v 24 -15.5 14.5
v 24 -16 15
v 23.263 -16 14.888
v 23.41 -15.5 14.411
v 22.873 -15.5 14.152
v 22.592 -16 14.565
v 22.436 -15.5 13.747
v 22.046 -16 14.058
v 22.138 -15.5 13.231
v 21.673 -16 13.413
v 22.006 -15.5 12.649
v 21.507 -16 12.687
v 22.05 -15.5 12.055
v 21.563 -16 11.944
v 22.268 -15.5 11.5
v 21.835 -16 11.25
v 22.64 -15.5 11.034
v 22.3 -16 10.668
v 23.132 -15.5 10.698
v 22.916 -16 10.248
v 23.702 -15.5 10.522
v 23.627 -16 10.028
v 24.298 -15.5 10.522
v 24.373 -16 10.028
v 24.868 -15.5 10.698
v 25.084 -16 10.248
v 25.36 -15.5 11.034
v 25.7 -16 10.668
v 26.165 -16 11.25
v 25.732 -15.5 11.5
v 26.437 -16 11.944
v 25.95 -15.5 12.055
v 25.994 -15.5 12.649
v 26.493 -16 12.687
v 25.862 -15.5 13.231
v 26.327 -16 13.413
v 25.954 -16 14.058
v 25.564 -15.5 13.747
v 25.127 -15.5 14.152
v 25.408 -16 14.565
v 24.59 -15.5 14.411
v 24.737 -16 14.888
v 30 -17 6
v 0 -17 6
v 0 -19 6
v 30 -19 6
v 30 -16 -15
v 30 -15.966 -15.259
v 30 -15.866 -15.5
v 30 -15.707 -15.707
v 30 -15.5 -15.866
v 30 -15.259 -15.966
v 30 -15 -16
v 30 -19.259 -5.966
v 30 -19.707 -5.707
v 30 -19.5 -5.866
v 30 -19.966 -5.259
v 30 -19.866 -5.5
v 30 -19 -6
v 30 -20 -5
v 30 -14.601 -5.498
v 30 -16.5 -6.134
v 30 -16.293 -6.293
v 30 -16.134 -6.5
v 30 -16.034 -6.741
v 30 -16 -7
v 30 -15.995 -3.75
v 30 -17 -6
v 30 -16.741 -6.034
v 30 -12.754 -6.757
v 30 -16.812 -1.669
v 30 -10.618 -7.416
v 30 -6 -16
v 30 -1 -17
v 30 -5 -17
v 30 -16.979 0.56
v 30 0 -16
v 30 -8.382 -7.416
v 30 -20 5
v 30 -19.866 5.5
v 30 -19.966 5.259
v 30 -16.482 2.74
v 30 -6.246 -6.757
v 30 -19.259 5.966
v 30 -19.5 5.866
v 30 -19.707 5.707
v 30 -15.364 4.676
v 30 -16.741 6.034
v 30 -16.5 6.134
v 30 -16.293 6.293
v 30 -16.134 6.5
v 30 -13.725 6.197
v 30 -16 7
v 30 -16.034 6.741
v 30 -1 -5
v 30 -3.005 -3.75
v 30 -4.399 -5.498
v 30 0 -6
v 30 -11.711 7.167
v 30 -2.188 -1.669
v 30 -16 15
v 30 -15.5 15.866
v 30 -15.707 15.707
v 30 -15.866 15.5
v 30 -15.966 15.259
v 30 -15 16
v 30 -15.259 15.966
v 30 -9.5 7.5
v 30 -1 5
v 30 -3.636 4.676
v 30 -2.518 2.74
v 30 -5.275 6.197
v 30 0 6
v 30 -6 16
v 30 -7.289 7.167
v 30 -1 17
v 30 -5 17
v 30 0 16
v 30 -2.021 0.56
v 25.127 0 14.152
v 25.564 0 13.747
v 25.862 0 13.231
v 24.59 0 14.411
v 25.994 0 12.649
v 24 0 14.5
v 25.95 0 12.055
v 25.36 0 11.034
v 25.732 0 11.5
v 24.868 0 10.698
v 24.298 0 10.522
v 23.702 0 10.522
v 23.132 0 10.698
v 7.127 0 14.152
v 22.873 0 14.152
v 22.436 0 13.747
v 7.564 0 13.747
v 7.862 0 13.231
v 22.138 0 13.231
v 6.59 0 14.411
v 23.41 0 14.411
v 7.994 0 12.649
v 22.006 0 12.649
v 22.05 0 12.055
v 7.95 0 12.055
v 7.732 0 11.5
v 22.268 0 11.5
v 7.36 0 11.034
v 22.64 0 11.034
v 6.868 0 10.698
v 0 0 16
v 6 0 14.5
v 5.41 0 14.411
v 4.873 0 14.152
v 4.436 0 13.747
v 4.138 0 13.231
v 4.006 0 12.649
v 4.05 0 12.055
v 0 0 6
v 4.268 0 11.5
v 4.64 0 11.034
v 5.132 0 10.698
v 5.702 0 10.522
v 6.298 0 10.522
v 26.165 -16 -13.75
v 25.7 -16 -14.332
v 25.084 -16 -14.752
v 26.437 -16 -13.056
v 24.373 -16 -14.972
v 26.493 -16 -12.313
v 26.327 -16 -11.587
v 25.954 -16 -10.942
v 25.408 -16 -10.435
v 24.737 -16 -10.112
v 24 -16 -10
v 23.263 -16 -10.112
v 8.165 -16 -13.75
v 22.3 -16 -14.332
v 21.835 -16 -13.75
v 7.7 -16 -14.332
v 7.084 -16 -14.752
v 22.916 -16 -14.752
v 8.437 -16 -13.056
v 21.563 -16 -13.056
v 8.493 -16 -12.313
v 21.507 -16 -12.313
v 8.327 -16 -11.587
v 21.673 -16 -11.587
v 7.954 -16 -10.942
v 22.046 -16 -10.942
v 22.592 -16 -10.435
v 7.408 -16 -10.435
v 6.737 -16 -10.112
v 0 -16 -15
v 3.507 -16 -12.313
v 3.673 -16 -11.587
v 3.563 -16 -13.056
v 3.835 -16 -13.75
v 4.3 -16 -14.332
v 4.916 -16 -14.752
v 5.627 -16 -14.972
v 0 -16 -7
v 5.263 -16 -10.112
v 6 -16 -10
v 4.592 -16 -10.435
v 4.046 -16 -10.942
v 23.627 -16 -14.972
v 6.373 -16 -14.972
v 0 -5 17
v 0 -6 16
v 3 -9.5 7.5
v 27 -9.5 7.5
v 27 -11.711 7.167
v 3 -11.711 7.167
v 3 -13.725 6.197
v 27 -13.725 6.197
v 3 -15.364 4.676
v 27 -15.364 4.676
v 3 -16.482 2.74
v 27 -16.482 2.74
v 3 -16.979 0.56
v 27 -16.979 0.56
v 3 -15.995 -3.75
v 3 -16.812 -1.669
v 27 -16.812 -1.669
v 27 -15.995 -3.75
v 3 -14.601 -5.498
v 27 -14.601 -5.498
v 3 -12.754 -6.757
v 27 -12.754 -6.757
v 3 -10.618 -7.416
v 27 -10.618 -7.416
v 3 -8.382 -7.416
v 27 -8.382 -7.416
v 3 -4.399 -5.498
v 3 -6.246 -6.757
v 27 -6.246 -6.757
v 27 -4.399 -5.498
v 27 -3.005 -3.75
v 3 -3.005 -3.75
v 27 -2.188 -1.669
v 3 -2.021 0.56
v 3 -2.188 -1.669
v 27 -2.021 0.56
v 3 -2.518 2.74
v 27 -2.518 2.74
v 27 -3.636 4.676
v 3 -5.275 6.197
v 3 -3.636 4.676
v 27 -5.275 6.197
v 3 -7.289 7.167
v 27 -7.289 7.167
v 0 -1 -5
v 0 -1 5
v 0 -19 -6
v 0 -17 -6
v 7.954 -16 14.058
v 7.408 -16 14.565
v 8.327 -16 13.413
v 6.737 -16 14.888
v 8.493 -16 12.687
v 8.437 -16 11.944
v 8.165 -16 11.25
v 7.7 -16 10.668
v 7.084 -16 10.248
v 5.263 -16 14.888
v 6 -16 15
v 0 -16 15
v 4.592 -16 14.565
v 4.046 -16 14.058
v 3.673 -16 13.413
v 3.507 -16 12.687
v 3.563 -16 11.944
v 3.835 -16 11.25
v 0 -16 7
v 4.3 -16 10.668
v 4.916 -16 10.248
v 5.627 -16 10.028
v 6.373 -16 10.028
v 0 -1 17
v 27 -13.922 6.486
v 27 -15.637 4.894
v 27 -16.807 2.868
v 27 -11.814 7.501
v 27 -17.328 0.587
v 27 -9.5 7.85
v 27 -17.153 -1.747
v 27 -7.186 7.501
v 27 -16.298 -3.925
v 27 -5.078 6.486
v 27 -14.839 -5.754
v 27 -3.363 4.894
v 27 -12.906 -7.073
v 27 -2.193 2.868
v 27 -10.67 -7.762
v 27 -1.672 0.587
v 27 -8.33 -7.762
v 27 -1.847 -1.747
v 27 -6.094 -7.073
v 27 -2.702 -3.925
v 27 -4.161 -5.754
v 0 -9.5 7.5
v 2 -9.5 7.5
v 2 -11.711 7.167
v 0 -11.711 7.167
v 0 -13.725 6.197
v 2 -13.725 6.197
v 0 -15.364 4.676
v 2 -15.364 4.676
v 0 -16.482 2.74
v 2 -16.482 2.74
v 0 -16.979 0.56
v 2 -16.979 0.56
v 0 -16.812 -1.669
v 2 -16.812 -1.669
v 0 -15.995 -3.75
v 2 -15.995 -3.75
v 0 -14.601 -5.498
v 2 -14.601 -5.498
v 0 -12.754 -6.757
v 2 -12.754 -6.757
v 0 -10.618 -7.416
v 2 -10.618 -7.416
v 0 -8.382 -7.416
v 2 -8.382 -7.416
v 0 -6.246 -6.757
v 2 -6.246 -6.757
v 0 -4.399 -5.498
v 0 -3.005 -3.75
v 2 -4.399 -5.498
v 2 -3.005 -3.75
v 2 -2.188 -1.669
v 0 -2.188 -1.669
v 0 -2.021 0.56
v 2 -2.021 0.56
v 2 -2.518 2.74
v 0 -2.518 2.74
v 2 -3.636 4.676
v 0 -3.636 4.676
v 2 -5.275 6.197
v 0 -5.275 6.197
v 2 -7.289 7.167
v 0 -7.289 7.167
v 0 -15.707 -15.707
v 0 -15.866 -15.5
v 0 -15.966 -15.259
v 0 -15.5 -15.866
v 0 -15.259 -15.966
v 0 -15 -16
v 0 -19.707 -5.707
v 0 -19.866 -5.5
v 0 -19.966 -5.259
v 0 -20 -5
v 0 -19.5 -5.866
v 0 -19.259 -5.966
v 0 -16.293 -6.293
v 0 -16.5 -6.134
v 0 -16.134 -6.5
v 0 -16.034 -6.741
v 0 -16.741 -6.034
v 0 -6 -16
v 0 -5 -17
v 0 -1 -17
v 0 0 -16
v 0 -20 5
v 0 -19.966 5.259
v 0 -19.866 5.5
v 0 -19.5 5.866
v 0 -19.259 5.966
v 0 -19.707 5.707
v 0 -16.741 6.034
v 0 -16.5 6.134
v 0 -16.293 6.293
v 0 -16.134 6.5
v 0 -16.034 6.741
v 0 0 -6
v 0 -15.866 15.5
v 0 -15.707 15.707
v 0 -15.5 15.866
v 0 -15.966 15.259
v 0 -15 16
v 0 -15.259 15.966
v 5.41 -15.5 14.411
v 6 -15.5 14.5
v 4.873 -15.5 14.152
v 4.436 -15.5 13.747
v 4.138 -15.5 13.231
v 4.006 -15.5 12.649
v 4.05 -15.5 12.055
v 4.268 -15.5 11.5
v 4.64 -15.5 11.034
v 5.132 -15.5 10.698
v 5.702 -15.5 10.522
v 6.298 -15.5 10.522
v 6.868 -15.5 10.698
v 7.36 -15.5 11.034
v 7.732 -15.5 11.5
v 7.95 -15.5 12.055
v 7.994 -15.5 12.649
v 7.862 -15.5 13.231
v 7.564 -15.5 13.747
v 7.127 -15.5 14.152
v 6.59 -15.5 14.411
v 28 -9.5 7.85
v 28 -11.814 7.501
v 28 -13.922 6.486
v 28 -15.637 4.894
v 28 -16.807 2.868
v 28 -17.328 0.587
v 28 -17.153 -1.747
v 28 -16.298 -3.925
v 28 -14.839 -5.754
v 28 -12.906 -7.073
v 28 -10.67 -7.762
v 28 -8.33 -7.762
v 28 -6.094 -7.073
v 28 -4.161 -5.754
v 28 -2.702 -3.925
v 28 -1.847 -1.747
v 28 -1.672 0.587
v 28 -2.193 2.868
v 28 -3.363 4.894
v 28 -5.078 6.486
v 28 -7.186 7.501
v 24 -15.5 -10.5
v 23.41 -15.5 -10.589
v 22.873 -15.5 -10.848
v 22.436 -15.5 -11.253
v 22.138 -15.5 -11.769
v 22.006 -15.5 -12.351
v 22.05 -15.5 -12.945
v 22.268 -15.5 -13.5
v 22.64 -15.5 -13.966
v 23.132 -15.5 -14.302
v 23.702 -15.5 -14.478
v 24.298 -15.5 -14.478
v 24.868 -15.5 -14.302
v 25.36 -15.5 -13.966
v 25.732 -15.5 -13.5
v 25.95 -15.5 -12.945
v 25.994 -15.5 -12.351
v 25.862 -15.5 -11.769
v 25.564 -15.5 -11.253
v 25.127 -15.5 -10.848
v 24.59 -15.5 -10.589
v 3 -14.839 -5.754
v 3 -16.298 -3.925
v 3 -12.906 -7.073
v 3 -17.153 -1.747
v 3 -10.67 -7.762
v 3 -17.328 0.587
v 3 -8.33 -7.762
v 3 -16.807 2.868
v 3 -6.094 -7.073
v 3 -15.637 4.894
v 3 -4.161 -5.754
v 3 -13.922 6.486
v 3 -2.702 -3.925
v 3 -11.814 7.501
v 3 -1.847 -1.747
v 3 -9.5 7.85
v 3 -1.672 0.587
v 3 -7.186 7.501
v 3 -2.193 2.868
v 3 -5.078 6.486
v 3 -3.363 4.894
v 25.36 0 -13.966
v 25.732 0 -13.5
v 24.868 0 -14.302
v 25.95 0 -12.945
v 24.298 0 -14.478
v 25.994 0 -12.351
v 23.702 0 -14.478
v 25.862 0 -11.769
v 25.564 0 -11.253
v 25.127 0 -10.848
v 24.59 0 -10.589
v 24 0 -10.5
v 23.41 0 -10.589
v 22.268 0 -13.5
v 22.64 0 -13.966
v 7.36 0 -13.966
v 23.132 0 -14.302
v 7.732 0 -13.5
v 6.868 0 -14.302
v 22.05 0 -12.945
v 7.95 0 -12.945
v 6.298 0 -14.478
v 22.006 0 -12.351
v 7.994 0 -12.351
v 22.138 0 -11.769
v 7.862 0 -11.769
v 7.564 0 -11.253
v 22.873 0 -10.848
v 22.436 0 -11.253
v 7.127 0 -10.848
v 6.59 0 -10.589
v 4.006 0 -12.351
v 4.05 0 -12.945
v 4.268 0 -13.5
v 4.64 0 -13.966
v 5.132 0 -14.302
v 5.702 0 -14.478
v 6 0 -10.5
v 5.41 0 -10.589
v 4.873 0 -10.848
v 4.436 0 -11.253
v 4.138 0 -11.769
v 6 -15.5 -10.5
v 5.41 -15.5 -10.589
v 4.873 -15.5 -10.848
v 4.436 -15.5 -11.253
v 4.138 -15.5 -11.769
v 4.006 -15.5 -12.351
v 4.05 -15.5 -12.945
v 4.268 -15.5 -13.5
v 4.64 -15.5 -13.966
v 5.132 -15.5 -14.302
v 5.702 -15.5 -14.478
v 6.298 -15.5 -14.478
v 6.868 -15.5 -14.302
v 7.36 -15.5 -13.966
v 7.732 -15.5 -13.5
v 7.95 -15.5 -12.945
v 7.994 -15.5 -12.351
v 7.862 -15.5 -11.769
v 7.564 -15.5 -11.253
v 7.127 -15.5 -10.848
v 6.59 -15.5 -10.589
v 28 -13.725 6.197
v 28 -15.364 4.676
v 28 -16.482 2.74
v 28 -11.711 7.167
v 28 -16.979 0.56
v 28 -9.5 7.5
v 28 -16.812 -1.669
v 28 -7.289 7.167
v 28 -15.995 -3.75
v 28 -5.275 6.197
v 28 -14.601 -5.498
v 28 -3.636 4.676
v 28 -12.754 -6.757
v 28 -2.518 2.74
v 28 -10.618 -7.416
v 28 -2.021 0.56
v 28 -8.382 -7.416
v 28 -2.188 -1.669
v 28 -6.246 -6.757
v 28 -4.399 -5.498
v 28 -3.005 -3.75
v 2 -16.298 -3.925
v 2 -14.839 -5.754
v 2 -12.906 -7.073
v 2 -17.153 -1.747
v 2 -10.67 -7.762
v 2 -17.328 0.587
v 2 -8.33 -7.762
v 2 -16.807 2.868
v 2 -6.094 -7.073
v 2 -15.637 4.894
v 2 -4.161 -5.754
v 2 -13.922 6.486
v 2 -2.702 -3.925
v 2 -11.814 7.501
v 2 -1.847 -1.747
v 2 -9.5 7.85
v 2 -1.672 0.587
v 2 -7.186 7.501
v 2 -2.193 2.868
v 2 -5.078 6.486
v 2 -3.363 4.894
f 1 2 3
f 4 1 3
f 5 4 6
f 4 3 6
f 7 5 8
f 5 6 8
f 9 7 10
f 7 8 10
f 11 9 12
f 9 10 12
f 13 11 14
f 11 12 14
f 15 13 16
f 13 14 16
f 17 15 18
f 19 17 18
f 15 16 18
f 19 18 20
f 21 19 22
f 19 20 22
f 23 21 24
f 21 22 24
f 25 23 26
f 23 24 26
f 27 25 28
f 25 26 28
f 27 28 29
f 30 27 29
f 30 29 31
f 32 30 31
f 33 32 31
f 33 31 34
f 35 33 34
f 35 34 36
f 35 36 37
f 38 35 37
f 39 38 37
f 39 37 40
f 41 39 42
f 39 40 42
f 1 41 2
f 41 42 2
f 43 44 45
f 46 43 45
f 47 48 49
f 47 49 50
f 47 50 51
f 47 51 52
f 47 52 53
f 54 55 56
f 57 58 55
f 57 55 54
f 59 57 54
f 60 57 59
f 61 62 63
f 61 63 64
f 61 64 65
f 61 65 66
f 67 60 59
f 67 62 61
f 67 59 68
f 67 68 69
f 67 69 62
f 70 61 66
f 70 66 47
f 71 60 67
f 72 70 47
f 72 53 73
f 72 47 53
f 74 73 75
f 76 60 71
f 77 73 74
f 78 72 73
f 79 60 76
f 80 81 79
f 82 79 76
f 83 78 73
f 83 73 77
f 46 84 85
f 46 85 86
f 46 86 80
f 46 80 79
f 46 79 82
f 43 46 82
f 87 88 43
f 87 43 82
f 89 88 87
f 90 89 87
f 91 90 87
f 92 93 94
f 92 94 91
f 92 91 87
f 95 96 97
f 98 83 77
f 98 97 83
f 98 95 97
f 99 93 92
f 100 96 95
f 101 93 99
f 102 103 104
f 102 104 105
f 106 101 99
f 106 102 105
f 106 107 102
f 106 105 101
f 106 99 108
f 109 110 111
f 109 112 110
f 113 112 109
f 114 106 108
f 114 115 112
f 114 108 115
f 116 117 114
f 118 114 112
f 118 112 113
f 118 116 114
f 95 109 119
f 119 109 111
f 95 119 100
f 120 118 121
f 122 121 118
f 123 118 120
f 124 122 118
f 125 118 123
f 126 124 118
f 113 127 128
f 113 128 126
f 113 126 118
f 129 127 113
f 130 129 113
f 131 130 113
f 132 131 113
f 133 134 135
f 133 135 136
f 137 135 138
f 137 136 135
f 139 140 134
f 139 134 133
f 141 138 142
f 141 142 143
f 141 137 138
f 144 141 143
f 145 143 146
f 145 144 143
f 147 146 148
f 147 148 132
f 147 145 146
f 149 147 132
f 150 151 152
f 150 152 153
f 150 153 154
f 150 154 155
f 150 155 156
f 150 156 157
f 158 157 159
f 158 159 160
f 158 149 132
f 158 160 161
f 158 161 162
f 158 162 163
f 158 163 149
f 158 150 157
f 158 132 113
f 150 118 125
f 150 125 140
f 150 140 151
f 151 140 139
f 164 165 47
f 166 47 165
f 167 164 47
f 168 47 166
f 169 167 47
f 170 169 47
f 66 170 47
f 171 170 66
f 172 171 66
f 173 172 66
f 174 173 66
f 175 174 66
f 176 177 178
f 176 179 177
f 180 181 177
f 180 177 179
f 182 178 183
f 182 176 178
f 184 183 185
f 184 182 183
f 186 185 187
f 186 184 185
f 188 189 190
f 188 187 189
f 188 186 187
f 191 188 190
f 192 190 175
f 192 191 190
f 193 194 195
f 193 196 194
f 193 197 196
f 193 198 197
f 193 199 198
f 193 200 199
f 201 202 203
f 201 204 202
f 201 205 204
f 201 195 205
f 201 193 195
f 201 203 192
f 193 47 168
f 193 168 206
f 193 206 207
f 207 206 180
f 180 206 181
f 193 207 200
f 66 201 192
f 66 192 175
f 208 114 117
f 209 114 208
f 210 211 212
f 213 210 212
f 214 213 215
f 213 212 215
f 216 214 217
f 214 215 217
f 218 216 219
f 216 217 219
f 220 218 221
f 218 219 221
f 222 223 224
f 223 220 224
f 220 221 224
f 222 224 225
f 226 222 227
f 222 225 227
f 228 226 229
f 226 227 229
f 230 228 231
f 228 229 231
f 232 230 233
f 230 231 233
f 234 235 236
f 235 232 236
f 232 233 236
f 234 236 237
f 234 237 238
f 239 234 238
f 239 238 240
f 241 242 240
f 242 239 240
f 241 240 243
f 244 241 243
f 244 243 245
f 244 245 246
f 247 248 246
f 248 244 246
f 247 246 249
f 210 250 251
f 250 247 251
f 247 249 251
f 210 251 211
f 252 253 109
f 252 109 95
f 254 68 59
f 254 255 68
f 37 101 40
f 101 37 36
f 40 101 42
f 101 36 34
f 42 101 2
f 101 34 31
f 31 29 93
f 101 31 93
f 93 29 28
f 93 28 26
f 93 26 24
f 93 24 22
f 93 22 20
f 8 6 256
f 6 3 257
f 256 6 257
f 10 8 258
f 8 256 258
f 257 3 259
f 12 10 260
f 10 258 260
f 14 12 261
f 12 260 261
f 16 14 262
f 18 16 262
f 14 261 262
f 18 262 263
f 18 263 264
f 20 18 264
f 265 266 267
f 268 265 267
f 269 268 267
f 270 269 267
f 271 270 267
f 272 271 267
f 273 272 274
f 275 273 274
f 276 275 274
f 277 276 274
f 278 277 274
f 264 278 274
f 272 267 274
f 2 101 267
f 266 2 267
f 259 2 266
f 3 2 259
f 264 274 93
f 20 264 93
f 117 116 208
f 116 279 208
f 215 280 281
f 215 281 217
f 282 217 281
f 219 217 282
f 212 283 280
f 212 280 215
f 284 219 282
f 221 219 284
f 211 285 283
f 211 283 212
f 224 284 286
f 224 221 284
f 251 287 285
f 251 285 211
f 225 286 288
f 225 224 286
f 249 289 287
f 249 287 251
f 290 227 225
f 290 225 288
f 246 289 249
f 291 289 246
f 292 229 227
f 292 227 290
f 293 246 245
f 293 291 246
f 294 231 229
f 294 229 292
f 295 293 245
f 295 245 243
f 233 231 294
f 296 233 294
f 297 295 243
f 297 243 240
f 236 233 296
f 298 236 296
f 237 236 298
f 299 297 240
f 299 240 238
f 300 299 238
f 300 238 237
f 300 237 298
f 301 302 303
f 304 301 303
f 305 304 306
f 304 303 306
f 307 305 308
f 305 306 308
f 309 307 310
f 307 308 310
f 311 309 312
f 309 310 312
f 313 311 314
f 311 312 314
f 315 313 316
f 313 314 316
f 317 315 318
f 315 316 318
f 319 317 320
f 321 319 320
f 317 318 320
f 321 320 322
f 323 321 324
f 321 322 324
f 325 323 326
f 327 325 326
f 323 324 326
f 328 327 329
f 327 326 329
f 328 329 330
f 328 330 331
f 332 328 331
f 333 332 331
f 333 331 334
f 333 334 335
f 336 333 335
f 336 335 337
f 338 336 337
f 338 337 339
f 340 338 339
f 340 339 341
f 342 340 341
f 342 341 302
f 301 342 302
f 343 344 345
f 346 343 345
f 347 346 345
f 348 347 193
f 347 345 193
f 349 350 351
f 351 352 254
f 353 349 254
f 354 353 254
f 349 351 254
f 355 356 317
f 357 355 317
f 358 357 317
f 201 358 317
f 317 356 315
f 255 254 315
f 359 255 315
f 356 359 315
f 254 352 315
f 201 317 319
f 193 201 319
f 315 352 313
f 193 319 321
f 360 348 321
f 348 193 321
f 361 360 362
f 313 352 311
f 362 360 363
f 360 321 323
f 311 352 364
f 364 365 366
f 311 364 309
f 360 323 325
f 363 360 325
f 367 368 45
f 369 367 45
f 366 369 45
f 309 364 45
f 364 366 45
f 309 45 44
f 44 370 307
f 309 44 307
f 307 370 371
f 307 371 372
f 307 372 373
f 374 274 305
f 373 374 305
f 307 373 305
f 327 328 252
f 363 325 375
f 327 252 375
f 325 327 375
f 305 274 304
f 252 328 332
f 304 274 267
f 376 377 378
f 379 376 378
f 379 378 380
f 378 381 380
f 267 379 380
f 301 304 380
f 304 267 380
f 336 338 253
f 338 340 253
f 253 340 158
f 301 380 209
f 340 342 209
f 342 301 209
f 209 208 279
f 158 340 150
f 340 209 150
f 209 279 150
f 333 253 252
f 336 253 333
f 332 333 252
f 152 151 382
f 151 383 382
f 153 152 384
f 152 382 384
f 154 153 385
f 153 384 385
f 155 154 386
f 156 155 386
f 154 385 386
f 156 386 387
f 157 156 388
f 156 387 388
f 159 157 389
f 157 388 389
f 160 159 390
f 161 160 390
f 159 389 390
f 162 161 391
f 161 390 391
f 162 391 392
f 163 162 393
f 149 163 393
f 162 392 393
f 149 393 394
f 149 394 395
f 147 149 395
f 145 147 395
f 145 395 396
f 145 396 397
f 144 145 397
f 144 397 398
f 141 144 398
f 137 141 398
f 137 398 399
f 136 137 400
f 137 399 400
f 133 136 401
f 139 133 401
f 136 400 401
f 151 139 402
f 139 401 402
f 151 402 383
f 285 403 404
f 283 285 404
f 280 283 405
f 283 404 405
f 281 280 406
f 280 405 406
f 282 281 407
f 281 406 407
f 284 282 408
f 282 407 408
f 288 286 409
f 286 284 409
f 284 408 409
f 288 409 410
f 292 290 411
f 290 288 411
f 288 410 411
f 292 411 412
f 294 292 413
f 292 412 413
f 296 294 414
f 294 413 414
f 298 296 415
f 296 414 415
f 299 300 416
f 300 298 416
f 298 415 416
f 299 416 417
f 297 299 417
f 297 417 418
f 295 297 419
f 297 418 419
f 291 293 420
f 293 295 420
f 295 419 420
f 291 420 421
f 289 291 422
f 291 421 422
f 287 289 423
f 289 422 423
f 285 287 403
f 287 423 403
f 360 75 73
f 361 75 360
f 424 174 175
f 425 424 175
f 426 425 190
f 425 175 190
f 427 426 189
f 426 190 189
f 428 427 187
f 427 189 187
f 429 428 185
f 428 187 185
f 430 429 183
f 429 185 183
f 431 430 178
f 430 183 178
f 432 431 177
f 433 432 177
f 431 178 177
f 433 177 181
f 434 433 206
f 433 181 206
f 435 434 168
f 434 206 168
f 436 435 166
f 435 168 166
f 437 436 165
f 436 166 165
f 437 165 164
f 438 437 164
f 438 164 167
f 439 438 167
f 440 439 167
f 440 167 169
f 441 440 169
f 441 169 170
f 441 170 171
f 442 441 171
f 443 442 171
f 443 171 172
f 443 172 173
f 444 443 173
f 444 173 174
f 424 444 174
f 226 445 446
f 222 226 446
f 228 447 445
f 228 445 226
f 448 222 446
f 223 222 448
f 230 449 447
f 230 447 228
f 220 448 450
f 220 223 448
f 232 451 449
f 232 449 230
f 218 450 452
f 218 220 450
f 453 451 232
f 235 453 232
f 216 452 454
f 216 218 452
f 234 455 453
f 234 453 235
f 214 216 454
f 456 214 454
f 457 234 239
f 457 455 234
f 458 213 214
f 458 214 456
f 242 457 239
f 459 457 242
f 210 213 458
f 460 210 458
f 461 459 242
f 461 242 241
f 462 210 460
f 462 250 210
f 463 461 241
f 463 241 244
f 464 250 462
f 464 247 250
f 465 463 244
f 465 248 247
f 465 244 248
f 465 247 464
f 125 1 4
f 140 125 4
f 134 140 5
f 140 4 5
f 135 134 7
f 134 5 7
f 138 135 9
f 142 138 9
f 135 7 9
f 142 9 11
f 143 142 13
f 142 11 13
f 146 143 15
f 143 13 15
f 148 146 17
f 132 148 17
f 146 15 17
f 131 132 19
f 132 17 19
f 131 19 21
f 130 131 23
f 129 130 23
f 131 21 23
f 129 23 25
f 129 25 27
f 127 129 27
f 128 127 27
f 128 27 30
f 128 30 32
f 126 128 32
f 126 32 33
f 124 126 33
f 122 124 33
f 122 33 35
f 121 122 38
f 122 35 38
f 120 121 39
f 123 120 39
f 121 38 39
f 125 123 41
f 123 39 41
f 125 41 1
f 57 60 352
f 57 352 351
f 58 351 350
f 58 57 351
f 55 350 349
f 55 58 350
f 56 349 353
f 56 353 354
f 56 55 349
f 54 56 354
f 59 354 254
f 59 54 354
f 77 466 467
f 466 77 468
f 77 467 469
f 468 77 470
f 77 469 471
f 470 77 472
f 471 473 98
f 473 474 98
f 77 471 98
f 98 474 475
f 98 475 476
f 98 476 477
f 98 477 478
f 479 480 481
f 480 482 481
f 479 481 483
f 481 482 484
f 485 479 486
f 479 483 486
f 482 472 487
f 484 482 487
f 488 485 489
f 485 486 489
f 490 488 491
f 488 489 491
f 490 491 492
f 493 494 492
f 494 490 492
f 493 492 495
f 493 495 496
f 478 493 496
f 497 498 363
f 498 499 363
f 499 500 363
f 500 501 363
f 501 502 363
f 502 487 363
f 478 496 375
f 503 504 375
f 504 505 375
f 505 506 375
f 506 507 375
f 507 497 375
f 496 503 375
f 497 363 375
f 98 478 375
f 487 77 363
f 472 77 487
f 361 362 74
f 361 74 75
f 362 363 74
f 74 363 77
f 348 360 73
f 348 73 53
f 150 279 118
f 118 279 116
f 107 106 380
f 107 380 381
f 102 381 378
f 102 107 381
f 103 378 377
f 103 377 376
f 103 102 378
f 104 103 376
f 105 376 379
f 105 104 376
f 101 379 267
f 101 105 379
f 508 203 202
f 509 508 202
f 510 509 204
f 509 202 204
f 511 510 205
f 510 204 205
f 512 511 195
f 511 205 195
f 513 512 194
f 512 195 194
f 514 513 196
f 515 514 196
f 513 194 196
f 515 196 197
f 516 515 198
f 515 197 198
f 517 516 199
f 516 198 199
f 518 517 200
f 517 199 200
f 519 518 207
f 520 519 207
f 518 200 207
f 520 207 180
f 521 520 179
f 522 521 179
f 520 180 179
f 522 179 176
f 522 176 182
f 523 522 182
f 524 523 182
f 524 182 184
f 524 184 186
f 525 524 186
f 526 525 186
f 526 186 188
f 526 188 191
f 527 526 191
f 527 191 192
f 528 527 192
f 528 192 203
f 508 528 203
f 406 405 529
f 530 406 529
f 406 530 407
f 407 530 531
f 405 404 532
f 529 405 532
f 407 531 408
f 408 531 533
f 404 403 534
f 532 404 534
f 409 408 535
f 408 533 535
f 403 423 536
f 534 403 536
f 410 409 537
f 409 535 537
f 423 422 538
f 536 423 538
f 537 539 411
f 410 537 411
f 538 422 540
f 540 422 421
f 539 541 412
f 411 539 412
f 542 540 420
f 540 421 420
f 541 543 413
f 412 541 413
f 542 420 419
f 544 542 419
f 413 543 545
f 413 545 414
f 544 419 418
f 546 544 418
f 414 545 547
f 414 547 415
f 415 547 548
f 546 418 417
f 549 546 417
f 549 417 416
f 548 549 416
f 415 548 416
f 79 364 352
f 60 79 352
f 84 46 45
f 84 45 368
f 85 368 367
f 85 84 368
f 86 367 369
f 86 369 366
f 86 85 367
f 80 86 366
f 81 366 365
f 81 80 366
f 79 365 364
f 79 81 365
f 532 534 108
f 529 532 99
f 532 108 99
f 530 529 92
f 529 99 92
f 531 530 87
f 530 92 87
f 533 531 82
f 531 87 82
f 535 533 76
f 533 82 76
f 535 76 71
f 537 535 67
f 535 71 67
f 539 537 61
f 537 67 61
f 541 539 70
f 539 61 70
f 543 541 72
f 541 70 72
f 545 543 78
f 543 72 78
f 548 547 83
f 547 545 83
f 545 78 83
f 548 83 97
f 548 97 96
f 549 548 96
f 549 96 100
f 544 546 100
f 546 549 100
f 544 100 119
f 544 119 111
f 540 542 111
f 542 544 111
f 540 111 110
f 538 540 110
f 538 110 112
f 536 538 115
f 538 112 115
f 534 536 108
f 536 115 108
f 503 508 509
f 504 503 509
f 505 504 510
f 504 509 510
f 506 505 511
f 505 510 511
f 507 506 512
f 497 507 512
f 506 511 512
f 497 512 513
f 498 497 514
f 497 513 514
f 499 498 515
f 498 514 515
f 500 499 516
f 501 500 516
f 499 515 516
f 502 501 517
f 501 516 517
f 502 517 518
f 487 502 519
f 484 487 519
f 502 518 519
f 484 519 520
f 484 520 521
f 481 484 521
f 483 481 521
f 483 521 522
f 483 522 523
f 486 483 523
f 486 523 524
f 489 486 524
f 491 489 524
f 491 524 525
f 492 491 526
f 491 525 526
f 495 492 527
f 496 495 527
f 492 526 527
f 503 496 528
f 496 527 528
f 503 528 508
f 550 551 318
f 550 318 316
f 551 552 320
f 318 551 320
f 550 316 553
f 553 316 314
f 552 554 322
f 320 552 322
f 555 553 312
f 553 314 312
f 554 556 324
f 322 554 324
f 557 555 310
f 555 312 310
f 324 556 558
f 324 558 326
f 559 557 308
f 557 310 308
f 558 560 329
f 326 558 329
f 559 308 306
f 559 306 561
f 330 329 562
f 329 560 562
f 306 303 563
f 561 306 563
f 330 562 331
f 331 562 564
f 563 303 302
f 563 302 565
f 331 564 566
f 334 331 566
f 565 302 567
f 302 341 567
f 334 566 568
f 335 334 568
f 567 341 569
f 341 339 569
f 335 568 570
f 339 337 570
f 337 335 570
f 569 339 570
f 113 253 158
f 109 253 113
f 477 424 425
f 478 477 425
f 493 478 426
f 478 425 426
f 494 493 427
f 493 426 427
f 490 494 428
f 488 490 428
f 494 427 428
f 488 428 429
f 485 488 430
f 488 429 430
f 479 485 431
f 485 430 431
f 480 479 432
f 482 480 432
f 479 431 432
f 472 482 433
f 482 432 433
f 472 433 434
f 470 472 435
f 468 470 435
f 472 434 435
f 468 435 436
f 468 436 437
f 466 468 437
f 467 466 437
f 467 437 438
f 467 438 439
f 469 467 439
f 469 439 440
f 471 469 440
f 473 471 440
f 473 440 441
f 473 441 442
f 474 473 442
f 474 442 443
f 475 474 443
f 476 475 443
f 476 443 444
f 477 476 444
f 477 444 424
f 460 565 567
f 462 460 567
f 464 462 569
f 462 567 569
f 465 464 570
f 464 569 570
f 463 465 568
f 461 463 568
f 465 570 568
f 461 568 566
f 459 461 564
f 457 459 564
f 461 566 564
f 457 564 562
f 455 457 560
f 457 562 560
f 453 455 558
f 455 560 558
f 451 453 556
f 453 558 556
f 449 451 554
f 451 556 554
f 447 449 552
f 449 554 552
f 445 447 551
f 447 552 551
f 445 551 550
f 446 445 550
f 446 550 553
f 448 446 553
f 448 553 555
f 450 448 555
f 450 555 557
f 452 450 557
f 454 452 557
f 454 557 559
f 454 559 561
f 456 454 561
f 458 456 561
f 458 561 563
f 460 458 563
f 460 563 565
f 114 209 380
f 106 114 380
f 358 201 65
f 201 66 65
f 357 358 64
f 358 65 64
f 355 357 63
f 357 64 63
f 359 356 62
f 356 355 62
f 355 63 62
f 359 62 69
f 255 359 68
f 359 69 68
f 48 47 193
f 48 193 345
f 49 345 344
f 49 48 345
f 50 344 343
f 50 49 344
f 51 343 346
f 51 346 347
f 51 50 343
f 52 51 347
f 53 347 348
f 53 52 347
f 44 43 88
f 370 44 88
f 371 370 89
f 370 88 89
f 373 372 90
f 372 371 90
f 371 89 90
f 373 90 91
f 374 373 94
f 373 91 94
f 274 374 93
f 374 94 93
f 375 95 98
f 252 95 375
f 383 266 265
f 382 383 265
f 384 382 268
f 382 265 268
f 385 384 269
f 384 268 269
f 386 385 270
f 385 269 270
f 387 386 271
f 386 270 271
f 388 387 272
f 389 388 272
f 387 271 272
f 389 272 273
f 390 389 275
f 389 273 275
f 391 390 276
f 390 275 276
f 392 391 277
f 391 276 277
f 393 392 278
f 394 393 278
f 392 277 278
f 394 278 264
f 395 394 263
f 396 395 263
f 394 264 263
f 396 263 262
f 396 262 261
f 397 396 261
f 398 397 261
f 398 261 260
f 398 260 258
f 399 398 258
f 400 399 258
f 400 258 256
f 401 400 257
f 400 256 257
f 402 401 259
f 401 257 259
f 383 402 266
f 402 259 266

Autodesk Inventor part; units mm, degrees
ref_plane "YZ Plane" through (0, 0, 0) normal (1, 0, 0) x (0, 1, 0)
sketch "Szkic1" plane through (0, 0, 0) normal (1, 0, 0) x (0, 1, 0)
  line L0 (0, 17) -> (-6, 17)
  line L1 (-6, 17) -> (-6, 16)
  line L2 (-6, 16) -> (-16, 16)
  line L3 (-16, 16) -> (-16, 6)
  line L4 (-16, 6) -> (-20, 6)
  line L5 (-20, 6) -> (-20, 0)
  line L6 (0, 17) -> (0, 5)
  line L7 (0, 5) -> (-1, 5)
  line L8 (-1, 5) -> (-1, 0)
  line L9 (-1, 0) -> (-20, 0) construction
  line L10 (0, -17) -> (-6, -17)
  line L11 (-6, -17) -> (-6, -16)
  line L12 (-6, -16) -> (-16, -16)
  line L13 (-16, -16) -> (-16, -6)
  line L14 (-16, -6) -> (-20, -6)
  line L15 (-20, -6) -> (-20, 0)
  line L16 (0, -17) -> (0, -5)
  line L17 (0, -5) -> (-1, -5)
  line L18 (-1, -5) -> (-1, 0)
  point P0 (0, 0)
  dimension "d0" = 17
  dimension "d1" = 6
  dimension "d2" = 1
  dimension "d3" = 10
  dimension "d4" = 10
  dimension "d5" = 4
  dimension "d40" = 12
  dimension "d41" = 1
  dimension "d43" = 6
extrude "Wyciągnięcie proste1" add sketch "Szkic1" along normal blind 30
ref_plane "Płaszczyzna konstrukcyjna2" through (2, 0, 0) normal (-1, 0, 0) x (0, 0, 1)
ref_plane "Płaszczyzna konstrukcyjna3" through (15, 0, 0) normal (-1, 0, 0) x (0, 0, 1)
sketch "Szkic7" plane through (0, 0, 0) normal (-1, 0, 0) x (0, 0, 1)
  line L0 (6, -20) -> (-6, -20) projected
  point P0 (0, 0)
  point P1 (0, -9.5)
  dimension "d44" = 10.5
hole "Otwór3" at (0, -9.5, 0) direction (1, 0, 0) diameter 15 end through all
sketch "Szkic8" plane through (2, 0, 0) normal (-1, 0, 0) x (0, 0, 1)
  circle A0 centre (0, -9.5) radius 7.5 projected
  circle A1 centre (0, -9.5) radius 7.85
  point P0 (0, 0)
  dimension "d52" = 15.7
extrude "Wyciągnięcie proste4" cut sketch "Szkic8" against normal blind 1
mirror "Odbij2" about plane through (15, 0, 0) normal (-1, 0, 0) of "Wyciągnięcie proste4"
sketch "Szkic9" plane through (0, 0, 17) normal (0, 1, 0) x (1, 0, 0)
  line L0 (0, 0) -> (30, 0) projected
  line L1 (30, 12) -> (30, 0) projected
  point P0 (0, 17)
  point P1 (24, 29.5)
  point P2 (24, 4.5)
  point P3 (6, 4.5)
  point P4 (6, 29.5)
  dimension "d55" = 18
  dimension "d56" = 25
  dimension "d57" = 4.5
  dimension "d58" = 6
chamfer "Faza2" distance 1 angle 45 6 edges at (15, 0, 5) (15, 0, -5) (15, 0, 17) (15, 0, -17) (15, -6, -17) (15, -6, 17)
fillet "Zaokrąglenie2" radius 1 6 edges at (15, -16, 16) (15, -20, 6) (15, -20, -6) (15, -16, -16) (15, -16, 6) (15, -16, -6)
hole "Otwór5" at (24, 0, -12.5) at (24, 0, 12.5) at (6, 0, 12.5) at (6, 0, -12.5) direction (0, -1, 0) diameter 4 end through all
chamfer "Faza3" distance 0.5 angle 45 4 edges at (24, -16, 10.5) (6, -16, 10.5) (24, -16, -14.5) (6, -16, -14.5)
properties part number "16_obudowa łożyska"
